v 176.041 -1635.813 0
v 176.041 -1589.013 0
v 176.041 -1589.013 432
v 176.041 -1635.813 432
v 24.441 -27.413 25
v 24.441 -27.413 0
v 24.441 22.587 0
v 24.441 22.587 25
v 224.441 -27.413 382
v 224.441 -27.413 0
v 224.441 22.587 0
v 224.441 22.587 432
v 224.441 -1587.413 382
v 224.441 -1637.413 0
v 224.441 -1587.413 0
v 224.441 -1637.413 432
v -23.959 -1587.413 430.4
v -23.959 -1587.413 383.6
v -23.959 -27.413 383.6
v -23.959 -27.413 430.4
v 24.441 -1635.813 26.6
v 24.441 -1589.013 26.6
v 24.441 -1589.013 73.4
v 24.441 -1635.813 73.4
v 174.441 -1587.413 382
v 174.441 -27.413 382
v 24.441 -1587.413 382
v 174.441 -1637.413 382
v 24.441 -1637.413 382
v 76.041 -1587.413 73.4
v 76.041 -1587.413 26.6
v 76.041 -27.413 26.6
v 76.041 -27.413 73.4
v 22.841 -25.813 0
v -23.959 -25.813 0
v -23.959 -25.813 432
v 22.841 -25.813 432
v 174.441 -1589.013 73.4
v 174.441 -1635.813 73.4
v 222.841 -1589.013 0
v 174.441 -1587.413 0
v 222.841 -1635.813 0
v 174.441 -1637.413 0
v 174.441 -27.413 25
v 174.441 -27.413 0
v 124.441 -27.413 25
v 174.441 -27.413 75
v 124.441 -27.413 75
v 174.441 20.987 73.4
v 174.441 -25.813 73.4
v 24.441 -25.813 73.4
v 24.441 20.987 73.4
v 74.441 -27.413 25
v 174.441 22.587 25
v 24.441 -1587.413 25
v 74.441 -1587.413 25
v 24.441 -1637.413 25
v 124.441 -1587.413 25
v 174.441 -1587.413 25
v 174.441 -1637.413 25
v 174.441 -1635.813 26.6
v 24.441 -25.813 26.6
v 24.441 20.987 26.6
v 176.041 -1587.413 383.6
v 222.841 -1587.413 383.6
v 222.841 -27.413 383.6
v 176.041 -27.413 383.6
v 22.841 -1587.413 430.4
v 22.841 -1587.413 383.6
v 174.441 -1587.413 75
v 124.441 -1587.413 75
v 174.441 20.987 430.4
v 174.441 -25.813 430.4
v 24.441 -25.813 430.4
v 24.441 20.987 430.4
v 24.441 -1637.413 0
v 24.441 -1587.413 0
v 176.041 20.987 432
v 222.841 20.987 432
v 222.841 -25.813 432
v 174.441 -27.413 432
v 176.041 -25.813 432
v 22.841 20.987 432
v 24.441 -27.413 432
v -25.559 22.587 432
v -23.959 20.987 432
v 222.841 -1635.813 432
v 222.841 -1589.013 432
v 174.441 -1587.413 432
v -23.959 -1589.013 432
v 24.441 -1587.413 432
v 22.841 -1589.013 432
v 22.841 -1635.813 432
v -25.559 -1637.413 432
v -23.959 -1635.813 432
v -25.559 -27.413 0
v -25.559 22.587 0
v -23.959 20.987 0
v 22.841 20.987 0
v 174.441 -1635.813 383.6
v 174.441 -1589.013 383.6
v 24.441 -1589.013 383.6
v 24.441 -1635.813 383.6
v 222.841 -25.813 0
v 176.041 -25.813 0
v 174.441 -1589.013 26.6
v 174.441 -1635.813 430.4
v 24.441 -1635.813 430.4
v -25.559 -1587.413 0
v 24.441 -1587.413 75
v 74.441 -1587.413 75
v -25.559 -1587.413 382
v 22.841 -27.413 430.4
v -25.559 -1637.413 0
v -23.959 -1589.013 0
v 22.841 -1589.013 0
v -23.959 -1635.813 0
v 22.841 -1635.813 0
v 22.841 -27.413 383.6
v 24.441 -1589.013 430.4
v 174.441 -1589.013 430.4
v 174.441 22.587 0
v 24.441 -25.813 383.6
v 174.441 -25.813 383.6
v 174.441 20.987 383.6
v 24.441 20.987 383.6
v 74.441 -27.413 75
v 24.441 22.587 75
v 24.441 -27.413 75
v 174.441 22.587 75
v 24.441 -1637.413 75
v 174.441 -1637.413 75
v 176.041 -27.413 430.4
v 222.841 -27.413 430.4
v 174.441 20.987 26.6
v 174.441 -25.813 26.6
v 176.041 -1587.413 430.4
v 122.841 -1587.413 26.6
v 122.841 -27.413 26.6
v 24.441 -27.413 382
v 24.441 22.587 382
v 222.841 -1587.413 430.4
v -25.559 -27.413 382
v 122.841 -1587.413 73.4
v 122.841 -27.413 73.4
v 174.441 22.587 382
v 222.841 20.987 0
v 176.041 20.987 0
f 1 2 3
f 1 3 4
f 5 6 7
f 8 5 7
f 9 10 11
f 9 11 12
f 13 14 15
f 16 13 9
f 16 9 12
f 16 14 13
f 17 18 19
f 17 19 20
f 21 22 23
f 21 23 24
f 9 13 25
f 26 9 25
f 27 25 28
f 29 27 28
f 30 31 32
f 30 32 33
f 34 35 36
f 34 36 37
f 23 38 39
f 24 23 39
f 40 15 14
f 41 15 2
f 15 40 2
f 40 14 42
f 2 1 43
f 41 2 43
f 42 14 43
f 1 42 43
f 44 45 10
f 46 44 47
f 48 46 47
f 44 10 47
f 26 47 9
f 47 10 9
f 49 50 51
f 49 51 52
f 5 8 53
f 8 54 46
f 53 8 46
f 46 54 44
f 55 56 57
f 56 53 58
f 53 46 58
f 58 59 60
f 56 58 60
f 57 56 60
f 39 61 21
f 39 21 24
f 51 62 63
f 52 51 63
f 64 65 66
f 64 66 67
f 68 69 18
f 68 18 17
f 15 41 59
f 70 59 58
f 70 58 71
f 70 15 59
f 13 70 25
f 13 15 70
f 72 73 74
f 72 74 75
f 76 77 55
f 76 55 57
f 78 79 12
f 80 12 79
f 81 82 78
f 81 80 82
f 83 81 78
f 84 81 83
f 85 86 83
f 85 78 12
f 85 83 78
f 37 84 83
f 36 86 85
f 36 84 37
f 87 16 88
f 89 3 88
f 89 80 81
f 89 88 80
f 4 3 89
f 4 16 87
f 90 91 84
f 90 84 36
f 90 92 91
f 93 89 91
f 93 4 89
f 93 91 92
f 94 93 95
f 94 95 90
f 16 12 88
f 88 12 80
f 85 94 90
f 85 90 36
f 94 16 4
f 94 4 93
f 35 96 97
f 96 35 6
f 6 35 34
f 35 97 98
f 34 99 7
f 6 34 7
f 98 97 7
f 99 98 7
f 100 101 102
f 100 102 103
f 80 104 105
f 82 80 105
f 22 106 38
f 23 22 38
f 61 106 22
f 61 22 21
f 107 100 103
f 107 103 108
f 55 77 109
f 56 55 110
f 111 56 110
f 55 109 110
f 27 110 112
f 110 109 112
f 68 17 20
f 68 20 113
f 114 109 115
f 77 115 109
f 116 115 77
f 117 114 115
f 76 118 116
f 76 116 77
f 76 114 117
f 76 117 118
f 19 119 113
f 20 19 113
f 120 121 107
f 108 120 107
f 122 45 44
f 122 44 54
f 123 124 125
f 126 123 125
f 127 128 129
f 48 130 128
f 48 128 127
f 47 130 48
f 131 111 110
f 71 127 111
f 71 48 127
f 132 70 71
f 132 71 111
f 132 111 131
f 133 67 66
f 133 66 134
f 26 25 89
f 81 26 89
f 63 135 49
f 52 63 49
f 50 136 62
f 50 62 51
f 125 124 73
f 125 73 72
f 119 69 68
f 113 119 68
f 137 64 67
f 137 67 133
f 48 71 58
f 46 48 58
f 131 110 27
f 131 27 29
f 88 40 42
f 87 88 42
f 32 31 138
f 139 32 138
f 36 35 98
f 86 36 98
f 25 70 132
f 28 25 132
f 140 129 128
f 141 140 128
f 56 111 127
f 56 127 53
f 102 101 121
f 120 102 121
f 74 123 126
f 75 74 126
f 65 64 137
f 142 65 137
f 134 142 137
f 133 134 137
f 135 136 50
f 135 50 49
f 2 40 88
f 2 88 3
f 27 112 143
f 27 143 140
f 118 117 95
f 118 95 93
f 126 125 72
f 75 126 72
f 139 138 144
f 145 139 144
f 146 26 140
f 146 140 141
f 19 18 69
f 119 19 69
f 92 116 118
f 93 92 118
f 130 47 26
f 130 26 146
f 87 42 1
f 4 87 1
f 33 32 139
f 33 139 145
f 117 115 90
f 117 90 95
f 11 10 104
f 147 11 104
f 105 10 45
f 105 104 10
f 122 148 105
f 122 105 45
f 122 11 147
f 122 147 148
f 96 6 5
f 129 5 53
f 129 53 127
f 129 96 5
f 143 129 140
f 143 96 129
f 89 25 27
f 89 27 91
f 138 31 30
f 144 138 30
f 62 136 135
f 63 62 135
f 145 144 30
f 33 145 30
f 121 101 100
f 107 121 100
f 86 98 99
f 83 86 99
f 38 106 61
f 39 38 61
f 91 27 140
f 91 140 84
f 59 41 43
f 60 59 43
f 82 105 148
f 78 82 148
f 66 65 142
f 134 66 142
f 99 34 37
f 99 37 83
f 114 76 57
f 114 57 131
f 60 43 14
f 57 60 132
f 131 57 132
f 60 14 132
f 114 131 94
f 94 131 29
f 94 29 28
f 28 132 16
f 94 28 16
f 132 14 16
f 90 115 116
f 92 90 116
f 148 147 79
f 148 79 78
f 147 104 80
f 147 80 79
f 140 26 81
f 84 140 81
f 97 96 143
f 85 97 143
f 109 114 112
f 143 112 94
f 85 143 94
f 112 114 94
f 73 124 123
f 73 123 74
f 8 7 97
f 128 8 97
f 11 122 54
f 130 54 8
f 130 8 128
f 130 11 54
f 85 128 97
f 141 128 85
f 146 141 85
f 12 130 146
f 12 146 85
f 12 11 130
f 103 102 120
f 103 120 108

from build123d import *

# Parameters (mm, degrees)
F0_W     = 50
F0_H     = 50
F0_W_2   = 46.8
F0_H_2   = 46.8
F1_DEPTH = 432
F2_W     = 50
F2_H     = 50
F2_W_2   = 46.8
F2_H_2   = 46.8
F3_DEPTH = 75
F4_W     = 50
F4_H     = 50
F4_W_2   = 46.8
F4_H_2   = 46.8
F5_DEPTH = 780


with BuildPart() as f1:
    # F0 (on Top) → F1 (new body)
    with BuildSketch(Plane.XY):
        with Locations((-0.5586, -2.413411)):
            Rectangle(F0_W, F0_H)
        with Locations((-0.5586, -2.413411)):
            Rectangle(F0_W_2, F0_H_2, mode=Mode.SUBTRACT)
    extrude(amount=F1_DEPTH)

    # F2 (on face) → F3 (join)
    with BuildSketch(Plane.YZ.offset(24.4414)):
        with Locations((-2.413411, 50)):
            Rectangle(F2_W, F2_H)
        with Locations((-2.413411, 50)):
            Rectangle(F2_W_2, F2_H_2, mode=Mode.SUBTRACT)
        with Locations((-2.413411, 407)):
            Rectangle(F2_W, F2_H)
        with Locations((-2.413411, 407)):
            Rectangle(F2_W_2, F2_H_2, mode=Mode.SUBTRACT)
    extrude(amount=F3_DEPTH)

    # F4 (on face) → F5 (join)
    with BuildSketch(Plane.XZ.offset(27.413411)):
        with Locations((-0.5586, 407)):
            Rectangle(F4_W, F4_H)
        with Locations((-0.5586, 407)):
            Rectangle(F4_W_2, F4_H_2, mode=Mode.SUBTRACT)
        Polygon((99.4414, 75), (74.4414, 75), (74.4414, 25), (99.4414, 25), (99.4414, 26.6), (76.0414, 26.6), (76.0414, 73.4), (99.4414, 73.4), align=None)
    extrude(amount=F5_DEPTH)

    # F6: F1 across face


with BuildPart() as f1_1:
    add(f1.part)
    add(f1.part.mirror(Plane(origin=(-0.5586, -807.413411, 407), x_dir=(1, 0, 0), z_dir=(0, -1, 0))))

    # F7: F1 across face


with BuildPart() as f1_2:
    add(f1_1.part)
    add(f1_1.part.mirror(Plane(origin=(99.4414, -2.413411, 407), x_dir=(0, 1, 0), z_dir=(1, 0, 0))))


solid = f1_2.part
